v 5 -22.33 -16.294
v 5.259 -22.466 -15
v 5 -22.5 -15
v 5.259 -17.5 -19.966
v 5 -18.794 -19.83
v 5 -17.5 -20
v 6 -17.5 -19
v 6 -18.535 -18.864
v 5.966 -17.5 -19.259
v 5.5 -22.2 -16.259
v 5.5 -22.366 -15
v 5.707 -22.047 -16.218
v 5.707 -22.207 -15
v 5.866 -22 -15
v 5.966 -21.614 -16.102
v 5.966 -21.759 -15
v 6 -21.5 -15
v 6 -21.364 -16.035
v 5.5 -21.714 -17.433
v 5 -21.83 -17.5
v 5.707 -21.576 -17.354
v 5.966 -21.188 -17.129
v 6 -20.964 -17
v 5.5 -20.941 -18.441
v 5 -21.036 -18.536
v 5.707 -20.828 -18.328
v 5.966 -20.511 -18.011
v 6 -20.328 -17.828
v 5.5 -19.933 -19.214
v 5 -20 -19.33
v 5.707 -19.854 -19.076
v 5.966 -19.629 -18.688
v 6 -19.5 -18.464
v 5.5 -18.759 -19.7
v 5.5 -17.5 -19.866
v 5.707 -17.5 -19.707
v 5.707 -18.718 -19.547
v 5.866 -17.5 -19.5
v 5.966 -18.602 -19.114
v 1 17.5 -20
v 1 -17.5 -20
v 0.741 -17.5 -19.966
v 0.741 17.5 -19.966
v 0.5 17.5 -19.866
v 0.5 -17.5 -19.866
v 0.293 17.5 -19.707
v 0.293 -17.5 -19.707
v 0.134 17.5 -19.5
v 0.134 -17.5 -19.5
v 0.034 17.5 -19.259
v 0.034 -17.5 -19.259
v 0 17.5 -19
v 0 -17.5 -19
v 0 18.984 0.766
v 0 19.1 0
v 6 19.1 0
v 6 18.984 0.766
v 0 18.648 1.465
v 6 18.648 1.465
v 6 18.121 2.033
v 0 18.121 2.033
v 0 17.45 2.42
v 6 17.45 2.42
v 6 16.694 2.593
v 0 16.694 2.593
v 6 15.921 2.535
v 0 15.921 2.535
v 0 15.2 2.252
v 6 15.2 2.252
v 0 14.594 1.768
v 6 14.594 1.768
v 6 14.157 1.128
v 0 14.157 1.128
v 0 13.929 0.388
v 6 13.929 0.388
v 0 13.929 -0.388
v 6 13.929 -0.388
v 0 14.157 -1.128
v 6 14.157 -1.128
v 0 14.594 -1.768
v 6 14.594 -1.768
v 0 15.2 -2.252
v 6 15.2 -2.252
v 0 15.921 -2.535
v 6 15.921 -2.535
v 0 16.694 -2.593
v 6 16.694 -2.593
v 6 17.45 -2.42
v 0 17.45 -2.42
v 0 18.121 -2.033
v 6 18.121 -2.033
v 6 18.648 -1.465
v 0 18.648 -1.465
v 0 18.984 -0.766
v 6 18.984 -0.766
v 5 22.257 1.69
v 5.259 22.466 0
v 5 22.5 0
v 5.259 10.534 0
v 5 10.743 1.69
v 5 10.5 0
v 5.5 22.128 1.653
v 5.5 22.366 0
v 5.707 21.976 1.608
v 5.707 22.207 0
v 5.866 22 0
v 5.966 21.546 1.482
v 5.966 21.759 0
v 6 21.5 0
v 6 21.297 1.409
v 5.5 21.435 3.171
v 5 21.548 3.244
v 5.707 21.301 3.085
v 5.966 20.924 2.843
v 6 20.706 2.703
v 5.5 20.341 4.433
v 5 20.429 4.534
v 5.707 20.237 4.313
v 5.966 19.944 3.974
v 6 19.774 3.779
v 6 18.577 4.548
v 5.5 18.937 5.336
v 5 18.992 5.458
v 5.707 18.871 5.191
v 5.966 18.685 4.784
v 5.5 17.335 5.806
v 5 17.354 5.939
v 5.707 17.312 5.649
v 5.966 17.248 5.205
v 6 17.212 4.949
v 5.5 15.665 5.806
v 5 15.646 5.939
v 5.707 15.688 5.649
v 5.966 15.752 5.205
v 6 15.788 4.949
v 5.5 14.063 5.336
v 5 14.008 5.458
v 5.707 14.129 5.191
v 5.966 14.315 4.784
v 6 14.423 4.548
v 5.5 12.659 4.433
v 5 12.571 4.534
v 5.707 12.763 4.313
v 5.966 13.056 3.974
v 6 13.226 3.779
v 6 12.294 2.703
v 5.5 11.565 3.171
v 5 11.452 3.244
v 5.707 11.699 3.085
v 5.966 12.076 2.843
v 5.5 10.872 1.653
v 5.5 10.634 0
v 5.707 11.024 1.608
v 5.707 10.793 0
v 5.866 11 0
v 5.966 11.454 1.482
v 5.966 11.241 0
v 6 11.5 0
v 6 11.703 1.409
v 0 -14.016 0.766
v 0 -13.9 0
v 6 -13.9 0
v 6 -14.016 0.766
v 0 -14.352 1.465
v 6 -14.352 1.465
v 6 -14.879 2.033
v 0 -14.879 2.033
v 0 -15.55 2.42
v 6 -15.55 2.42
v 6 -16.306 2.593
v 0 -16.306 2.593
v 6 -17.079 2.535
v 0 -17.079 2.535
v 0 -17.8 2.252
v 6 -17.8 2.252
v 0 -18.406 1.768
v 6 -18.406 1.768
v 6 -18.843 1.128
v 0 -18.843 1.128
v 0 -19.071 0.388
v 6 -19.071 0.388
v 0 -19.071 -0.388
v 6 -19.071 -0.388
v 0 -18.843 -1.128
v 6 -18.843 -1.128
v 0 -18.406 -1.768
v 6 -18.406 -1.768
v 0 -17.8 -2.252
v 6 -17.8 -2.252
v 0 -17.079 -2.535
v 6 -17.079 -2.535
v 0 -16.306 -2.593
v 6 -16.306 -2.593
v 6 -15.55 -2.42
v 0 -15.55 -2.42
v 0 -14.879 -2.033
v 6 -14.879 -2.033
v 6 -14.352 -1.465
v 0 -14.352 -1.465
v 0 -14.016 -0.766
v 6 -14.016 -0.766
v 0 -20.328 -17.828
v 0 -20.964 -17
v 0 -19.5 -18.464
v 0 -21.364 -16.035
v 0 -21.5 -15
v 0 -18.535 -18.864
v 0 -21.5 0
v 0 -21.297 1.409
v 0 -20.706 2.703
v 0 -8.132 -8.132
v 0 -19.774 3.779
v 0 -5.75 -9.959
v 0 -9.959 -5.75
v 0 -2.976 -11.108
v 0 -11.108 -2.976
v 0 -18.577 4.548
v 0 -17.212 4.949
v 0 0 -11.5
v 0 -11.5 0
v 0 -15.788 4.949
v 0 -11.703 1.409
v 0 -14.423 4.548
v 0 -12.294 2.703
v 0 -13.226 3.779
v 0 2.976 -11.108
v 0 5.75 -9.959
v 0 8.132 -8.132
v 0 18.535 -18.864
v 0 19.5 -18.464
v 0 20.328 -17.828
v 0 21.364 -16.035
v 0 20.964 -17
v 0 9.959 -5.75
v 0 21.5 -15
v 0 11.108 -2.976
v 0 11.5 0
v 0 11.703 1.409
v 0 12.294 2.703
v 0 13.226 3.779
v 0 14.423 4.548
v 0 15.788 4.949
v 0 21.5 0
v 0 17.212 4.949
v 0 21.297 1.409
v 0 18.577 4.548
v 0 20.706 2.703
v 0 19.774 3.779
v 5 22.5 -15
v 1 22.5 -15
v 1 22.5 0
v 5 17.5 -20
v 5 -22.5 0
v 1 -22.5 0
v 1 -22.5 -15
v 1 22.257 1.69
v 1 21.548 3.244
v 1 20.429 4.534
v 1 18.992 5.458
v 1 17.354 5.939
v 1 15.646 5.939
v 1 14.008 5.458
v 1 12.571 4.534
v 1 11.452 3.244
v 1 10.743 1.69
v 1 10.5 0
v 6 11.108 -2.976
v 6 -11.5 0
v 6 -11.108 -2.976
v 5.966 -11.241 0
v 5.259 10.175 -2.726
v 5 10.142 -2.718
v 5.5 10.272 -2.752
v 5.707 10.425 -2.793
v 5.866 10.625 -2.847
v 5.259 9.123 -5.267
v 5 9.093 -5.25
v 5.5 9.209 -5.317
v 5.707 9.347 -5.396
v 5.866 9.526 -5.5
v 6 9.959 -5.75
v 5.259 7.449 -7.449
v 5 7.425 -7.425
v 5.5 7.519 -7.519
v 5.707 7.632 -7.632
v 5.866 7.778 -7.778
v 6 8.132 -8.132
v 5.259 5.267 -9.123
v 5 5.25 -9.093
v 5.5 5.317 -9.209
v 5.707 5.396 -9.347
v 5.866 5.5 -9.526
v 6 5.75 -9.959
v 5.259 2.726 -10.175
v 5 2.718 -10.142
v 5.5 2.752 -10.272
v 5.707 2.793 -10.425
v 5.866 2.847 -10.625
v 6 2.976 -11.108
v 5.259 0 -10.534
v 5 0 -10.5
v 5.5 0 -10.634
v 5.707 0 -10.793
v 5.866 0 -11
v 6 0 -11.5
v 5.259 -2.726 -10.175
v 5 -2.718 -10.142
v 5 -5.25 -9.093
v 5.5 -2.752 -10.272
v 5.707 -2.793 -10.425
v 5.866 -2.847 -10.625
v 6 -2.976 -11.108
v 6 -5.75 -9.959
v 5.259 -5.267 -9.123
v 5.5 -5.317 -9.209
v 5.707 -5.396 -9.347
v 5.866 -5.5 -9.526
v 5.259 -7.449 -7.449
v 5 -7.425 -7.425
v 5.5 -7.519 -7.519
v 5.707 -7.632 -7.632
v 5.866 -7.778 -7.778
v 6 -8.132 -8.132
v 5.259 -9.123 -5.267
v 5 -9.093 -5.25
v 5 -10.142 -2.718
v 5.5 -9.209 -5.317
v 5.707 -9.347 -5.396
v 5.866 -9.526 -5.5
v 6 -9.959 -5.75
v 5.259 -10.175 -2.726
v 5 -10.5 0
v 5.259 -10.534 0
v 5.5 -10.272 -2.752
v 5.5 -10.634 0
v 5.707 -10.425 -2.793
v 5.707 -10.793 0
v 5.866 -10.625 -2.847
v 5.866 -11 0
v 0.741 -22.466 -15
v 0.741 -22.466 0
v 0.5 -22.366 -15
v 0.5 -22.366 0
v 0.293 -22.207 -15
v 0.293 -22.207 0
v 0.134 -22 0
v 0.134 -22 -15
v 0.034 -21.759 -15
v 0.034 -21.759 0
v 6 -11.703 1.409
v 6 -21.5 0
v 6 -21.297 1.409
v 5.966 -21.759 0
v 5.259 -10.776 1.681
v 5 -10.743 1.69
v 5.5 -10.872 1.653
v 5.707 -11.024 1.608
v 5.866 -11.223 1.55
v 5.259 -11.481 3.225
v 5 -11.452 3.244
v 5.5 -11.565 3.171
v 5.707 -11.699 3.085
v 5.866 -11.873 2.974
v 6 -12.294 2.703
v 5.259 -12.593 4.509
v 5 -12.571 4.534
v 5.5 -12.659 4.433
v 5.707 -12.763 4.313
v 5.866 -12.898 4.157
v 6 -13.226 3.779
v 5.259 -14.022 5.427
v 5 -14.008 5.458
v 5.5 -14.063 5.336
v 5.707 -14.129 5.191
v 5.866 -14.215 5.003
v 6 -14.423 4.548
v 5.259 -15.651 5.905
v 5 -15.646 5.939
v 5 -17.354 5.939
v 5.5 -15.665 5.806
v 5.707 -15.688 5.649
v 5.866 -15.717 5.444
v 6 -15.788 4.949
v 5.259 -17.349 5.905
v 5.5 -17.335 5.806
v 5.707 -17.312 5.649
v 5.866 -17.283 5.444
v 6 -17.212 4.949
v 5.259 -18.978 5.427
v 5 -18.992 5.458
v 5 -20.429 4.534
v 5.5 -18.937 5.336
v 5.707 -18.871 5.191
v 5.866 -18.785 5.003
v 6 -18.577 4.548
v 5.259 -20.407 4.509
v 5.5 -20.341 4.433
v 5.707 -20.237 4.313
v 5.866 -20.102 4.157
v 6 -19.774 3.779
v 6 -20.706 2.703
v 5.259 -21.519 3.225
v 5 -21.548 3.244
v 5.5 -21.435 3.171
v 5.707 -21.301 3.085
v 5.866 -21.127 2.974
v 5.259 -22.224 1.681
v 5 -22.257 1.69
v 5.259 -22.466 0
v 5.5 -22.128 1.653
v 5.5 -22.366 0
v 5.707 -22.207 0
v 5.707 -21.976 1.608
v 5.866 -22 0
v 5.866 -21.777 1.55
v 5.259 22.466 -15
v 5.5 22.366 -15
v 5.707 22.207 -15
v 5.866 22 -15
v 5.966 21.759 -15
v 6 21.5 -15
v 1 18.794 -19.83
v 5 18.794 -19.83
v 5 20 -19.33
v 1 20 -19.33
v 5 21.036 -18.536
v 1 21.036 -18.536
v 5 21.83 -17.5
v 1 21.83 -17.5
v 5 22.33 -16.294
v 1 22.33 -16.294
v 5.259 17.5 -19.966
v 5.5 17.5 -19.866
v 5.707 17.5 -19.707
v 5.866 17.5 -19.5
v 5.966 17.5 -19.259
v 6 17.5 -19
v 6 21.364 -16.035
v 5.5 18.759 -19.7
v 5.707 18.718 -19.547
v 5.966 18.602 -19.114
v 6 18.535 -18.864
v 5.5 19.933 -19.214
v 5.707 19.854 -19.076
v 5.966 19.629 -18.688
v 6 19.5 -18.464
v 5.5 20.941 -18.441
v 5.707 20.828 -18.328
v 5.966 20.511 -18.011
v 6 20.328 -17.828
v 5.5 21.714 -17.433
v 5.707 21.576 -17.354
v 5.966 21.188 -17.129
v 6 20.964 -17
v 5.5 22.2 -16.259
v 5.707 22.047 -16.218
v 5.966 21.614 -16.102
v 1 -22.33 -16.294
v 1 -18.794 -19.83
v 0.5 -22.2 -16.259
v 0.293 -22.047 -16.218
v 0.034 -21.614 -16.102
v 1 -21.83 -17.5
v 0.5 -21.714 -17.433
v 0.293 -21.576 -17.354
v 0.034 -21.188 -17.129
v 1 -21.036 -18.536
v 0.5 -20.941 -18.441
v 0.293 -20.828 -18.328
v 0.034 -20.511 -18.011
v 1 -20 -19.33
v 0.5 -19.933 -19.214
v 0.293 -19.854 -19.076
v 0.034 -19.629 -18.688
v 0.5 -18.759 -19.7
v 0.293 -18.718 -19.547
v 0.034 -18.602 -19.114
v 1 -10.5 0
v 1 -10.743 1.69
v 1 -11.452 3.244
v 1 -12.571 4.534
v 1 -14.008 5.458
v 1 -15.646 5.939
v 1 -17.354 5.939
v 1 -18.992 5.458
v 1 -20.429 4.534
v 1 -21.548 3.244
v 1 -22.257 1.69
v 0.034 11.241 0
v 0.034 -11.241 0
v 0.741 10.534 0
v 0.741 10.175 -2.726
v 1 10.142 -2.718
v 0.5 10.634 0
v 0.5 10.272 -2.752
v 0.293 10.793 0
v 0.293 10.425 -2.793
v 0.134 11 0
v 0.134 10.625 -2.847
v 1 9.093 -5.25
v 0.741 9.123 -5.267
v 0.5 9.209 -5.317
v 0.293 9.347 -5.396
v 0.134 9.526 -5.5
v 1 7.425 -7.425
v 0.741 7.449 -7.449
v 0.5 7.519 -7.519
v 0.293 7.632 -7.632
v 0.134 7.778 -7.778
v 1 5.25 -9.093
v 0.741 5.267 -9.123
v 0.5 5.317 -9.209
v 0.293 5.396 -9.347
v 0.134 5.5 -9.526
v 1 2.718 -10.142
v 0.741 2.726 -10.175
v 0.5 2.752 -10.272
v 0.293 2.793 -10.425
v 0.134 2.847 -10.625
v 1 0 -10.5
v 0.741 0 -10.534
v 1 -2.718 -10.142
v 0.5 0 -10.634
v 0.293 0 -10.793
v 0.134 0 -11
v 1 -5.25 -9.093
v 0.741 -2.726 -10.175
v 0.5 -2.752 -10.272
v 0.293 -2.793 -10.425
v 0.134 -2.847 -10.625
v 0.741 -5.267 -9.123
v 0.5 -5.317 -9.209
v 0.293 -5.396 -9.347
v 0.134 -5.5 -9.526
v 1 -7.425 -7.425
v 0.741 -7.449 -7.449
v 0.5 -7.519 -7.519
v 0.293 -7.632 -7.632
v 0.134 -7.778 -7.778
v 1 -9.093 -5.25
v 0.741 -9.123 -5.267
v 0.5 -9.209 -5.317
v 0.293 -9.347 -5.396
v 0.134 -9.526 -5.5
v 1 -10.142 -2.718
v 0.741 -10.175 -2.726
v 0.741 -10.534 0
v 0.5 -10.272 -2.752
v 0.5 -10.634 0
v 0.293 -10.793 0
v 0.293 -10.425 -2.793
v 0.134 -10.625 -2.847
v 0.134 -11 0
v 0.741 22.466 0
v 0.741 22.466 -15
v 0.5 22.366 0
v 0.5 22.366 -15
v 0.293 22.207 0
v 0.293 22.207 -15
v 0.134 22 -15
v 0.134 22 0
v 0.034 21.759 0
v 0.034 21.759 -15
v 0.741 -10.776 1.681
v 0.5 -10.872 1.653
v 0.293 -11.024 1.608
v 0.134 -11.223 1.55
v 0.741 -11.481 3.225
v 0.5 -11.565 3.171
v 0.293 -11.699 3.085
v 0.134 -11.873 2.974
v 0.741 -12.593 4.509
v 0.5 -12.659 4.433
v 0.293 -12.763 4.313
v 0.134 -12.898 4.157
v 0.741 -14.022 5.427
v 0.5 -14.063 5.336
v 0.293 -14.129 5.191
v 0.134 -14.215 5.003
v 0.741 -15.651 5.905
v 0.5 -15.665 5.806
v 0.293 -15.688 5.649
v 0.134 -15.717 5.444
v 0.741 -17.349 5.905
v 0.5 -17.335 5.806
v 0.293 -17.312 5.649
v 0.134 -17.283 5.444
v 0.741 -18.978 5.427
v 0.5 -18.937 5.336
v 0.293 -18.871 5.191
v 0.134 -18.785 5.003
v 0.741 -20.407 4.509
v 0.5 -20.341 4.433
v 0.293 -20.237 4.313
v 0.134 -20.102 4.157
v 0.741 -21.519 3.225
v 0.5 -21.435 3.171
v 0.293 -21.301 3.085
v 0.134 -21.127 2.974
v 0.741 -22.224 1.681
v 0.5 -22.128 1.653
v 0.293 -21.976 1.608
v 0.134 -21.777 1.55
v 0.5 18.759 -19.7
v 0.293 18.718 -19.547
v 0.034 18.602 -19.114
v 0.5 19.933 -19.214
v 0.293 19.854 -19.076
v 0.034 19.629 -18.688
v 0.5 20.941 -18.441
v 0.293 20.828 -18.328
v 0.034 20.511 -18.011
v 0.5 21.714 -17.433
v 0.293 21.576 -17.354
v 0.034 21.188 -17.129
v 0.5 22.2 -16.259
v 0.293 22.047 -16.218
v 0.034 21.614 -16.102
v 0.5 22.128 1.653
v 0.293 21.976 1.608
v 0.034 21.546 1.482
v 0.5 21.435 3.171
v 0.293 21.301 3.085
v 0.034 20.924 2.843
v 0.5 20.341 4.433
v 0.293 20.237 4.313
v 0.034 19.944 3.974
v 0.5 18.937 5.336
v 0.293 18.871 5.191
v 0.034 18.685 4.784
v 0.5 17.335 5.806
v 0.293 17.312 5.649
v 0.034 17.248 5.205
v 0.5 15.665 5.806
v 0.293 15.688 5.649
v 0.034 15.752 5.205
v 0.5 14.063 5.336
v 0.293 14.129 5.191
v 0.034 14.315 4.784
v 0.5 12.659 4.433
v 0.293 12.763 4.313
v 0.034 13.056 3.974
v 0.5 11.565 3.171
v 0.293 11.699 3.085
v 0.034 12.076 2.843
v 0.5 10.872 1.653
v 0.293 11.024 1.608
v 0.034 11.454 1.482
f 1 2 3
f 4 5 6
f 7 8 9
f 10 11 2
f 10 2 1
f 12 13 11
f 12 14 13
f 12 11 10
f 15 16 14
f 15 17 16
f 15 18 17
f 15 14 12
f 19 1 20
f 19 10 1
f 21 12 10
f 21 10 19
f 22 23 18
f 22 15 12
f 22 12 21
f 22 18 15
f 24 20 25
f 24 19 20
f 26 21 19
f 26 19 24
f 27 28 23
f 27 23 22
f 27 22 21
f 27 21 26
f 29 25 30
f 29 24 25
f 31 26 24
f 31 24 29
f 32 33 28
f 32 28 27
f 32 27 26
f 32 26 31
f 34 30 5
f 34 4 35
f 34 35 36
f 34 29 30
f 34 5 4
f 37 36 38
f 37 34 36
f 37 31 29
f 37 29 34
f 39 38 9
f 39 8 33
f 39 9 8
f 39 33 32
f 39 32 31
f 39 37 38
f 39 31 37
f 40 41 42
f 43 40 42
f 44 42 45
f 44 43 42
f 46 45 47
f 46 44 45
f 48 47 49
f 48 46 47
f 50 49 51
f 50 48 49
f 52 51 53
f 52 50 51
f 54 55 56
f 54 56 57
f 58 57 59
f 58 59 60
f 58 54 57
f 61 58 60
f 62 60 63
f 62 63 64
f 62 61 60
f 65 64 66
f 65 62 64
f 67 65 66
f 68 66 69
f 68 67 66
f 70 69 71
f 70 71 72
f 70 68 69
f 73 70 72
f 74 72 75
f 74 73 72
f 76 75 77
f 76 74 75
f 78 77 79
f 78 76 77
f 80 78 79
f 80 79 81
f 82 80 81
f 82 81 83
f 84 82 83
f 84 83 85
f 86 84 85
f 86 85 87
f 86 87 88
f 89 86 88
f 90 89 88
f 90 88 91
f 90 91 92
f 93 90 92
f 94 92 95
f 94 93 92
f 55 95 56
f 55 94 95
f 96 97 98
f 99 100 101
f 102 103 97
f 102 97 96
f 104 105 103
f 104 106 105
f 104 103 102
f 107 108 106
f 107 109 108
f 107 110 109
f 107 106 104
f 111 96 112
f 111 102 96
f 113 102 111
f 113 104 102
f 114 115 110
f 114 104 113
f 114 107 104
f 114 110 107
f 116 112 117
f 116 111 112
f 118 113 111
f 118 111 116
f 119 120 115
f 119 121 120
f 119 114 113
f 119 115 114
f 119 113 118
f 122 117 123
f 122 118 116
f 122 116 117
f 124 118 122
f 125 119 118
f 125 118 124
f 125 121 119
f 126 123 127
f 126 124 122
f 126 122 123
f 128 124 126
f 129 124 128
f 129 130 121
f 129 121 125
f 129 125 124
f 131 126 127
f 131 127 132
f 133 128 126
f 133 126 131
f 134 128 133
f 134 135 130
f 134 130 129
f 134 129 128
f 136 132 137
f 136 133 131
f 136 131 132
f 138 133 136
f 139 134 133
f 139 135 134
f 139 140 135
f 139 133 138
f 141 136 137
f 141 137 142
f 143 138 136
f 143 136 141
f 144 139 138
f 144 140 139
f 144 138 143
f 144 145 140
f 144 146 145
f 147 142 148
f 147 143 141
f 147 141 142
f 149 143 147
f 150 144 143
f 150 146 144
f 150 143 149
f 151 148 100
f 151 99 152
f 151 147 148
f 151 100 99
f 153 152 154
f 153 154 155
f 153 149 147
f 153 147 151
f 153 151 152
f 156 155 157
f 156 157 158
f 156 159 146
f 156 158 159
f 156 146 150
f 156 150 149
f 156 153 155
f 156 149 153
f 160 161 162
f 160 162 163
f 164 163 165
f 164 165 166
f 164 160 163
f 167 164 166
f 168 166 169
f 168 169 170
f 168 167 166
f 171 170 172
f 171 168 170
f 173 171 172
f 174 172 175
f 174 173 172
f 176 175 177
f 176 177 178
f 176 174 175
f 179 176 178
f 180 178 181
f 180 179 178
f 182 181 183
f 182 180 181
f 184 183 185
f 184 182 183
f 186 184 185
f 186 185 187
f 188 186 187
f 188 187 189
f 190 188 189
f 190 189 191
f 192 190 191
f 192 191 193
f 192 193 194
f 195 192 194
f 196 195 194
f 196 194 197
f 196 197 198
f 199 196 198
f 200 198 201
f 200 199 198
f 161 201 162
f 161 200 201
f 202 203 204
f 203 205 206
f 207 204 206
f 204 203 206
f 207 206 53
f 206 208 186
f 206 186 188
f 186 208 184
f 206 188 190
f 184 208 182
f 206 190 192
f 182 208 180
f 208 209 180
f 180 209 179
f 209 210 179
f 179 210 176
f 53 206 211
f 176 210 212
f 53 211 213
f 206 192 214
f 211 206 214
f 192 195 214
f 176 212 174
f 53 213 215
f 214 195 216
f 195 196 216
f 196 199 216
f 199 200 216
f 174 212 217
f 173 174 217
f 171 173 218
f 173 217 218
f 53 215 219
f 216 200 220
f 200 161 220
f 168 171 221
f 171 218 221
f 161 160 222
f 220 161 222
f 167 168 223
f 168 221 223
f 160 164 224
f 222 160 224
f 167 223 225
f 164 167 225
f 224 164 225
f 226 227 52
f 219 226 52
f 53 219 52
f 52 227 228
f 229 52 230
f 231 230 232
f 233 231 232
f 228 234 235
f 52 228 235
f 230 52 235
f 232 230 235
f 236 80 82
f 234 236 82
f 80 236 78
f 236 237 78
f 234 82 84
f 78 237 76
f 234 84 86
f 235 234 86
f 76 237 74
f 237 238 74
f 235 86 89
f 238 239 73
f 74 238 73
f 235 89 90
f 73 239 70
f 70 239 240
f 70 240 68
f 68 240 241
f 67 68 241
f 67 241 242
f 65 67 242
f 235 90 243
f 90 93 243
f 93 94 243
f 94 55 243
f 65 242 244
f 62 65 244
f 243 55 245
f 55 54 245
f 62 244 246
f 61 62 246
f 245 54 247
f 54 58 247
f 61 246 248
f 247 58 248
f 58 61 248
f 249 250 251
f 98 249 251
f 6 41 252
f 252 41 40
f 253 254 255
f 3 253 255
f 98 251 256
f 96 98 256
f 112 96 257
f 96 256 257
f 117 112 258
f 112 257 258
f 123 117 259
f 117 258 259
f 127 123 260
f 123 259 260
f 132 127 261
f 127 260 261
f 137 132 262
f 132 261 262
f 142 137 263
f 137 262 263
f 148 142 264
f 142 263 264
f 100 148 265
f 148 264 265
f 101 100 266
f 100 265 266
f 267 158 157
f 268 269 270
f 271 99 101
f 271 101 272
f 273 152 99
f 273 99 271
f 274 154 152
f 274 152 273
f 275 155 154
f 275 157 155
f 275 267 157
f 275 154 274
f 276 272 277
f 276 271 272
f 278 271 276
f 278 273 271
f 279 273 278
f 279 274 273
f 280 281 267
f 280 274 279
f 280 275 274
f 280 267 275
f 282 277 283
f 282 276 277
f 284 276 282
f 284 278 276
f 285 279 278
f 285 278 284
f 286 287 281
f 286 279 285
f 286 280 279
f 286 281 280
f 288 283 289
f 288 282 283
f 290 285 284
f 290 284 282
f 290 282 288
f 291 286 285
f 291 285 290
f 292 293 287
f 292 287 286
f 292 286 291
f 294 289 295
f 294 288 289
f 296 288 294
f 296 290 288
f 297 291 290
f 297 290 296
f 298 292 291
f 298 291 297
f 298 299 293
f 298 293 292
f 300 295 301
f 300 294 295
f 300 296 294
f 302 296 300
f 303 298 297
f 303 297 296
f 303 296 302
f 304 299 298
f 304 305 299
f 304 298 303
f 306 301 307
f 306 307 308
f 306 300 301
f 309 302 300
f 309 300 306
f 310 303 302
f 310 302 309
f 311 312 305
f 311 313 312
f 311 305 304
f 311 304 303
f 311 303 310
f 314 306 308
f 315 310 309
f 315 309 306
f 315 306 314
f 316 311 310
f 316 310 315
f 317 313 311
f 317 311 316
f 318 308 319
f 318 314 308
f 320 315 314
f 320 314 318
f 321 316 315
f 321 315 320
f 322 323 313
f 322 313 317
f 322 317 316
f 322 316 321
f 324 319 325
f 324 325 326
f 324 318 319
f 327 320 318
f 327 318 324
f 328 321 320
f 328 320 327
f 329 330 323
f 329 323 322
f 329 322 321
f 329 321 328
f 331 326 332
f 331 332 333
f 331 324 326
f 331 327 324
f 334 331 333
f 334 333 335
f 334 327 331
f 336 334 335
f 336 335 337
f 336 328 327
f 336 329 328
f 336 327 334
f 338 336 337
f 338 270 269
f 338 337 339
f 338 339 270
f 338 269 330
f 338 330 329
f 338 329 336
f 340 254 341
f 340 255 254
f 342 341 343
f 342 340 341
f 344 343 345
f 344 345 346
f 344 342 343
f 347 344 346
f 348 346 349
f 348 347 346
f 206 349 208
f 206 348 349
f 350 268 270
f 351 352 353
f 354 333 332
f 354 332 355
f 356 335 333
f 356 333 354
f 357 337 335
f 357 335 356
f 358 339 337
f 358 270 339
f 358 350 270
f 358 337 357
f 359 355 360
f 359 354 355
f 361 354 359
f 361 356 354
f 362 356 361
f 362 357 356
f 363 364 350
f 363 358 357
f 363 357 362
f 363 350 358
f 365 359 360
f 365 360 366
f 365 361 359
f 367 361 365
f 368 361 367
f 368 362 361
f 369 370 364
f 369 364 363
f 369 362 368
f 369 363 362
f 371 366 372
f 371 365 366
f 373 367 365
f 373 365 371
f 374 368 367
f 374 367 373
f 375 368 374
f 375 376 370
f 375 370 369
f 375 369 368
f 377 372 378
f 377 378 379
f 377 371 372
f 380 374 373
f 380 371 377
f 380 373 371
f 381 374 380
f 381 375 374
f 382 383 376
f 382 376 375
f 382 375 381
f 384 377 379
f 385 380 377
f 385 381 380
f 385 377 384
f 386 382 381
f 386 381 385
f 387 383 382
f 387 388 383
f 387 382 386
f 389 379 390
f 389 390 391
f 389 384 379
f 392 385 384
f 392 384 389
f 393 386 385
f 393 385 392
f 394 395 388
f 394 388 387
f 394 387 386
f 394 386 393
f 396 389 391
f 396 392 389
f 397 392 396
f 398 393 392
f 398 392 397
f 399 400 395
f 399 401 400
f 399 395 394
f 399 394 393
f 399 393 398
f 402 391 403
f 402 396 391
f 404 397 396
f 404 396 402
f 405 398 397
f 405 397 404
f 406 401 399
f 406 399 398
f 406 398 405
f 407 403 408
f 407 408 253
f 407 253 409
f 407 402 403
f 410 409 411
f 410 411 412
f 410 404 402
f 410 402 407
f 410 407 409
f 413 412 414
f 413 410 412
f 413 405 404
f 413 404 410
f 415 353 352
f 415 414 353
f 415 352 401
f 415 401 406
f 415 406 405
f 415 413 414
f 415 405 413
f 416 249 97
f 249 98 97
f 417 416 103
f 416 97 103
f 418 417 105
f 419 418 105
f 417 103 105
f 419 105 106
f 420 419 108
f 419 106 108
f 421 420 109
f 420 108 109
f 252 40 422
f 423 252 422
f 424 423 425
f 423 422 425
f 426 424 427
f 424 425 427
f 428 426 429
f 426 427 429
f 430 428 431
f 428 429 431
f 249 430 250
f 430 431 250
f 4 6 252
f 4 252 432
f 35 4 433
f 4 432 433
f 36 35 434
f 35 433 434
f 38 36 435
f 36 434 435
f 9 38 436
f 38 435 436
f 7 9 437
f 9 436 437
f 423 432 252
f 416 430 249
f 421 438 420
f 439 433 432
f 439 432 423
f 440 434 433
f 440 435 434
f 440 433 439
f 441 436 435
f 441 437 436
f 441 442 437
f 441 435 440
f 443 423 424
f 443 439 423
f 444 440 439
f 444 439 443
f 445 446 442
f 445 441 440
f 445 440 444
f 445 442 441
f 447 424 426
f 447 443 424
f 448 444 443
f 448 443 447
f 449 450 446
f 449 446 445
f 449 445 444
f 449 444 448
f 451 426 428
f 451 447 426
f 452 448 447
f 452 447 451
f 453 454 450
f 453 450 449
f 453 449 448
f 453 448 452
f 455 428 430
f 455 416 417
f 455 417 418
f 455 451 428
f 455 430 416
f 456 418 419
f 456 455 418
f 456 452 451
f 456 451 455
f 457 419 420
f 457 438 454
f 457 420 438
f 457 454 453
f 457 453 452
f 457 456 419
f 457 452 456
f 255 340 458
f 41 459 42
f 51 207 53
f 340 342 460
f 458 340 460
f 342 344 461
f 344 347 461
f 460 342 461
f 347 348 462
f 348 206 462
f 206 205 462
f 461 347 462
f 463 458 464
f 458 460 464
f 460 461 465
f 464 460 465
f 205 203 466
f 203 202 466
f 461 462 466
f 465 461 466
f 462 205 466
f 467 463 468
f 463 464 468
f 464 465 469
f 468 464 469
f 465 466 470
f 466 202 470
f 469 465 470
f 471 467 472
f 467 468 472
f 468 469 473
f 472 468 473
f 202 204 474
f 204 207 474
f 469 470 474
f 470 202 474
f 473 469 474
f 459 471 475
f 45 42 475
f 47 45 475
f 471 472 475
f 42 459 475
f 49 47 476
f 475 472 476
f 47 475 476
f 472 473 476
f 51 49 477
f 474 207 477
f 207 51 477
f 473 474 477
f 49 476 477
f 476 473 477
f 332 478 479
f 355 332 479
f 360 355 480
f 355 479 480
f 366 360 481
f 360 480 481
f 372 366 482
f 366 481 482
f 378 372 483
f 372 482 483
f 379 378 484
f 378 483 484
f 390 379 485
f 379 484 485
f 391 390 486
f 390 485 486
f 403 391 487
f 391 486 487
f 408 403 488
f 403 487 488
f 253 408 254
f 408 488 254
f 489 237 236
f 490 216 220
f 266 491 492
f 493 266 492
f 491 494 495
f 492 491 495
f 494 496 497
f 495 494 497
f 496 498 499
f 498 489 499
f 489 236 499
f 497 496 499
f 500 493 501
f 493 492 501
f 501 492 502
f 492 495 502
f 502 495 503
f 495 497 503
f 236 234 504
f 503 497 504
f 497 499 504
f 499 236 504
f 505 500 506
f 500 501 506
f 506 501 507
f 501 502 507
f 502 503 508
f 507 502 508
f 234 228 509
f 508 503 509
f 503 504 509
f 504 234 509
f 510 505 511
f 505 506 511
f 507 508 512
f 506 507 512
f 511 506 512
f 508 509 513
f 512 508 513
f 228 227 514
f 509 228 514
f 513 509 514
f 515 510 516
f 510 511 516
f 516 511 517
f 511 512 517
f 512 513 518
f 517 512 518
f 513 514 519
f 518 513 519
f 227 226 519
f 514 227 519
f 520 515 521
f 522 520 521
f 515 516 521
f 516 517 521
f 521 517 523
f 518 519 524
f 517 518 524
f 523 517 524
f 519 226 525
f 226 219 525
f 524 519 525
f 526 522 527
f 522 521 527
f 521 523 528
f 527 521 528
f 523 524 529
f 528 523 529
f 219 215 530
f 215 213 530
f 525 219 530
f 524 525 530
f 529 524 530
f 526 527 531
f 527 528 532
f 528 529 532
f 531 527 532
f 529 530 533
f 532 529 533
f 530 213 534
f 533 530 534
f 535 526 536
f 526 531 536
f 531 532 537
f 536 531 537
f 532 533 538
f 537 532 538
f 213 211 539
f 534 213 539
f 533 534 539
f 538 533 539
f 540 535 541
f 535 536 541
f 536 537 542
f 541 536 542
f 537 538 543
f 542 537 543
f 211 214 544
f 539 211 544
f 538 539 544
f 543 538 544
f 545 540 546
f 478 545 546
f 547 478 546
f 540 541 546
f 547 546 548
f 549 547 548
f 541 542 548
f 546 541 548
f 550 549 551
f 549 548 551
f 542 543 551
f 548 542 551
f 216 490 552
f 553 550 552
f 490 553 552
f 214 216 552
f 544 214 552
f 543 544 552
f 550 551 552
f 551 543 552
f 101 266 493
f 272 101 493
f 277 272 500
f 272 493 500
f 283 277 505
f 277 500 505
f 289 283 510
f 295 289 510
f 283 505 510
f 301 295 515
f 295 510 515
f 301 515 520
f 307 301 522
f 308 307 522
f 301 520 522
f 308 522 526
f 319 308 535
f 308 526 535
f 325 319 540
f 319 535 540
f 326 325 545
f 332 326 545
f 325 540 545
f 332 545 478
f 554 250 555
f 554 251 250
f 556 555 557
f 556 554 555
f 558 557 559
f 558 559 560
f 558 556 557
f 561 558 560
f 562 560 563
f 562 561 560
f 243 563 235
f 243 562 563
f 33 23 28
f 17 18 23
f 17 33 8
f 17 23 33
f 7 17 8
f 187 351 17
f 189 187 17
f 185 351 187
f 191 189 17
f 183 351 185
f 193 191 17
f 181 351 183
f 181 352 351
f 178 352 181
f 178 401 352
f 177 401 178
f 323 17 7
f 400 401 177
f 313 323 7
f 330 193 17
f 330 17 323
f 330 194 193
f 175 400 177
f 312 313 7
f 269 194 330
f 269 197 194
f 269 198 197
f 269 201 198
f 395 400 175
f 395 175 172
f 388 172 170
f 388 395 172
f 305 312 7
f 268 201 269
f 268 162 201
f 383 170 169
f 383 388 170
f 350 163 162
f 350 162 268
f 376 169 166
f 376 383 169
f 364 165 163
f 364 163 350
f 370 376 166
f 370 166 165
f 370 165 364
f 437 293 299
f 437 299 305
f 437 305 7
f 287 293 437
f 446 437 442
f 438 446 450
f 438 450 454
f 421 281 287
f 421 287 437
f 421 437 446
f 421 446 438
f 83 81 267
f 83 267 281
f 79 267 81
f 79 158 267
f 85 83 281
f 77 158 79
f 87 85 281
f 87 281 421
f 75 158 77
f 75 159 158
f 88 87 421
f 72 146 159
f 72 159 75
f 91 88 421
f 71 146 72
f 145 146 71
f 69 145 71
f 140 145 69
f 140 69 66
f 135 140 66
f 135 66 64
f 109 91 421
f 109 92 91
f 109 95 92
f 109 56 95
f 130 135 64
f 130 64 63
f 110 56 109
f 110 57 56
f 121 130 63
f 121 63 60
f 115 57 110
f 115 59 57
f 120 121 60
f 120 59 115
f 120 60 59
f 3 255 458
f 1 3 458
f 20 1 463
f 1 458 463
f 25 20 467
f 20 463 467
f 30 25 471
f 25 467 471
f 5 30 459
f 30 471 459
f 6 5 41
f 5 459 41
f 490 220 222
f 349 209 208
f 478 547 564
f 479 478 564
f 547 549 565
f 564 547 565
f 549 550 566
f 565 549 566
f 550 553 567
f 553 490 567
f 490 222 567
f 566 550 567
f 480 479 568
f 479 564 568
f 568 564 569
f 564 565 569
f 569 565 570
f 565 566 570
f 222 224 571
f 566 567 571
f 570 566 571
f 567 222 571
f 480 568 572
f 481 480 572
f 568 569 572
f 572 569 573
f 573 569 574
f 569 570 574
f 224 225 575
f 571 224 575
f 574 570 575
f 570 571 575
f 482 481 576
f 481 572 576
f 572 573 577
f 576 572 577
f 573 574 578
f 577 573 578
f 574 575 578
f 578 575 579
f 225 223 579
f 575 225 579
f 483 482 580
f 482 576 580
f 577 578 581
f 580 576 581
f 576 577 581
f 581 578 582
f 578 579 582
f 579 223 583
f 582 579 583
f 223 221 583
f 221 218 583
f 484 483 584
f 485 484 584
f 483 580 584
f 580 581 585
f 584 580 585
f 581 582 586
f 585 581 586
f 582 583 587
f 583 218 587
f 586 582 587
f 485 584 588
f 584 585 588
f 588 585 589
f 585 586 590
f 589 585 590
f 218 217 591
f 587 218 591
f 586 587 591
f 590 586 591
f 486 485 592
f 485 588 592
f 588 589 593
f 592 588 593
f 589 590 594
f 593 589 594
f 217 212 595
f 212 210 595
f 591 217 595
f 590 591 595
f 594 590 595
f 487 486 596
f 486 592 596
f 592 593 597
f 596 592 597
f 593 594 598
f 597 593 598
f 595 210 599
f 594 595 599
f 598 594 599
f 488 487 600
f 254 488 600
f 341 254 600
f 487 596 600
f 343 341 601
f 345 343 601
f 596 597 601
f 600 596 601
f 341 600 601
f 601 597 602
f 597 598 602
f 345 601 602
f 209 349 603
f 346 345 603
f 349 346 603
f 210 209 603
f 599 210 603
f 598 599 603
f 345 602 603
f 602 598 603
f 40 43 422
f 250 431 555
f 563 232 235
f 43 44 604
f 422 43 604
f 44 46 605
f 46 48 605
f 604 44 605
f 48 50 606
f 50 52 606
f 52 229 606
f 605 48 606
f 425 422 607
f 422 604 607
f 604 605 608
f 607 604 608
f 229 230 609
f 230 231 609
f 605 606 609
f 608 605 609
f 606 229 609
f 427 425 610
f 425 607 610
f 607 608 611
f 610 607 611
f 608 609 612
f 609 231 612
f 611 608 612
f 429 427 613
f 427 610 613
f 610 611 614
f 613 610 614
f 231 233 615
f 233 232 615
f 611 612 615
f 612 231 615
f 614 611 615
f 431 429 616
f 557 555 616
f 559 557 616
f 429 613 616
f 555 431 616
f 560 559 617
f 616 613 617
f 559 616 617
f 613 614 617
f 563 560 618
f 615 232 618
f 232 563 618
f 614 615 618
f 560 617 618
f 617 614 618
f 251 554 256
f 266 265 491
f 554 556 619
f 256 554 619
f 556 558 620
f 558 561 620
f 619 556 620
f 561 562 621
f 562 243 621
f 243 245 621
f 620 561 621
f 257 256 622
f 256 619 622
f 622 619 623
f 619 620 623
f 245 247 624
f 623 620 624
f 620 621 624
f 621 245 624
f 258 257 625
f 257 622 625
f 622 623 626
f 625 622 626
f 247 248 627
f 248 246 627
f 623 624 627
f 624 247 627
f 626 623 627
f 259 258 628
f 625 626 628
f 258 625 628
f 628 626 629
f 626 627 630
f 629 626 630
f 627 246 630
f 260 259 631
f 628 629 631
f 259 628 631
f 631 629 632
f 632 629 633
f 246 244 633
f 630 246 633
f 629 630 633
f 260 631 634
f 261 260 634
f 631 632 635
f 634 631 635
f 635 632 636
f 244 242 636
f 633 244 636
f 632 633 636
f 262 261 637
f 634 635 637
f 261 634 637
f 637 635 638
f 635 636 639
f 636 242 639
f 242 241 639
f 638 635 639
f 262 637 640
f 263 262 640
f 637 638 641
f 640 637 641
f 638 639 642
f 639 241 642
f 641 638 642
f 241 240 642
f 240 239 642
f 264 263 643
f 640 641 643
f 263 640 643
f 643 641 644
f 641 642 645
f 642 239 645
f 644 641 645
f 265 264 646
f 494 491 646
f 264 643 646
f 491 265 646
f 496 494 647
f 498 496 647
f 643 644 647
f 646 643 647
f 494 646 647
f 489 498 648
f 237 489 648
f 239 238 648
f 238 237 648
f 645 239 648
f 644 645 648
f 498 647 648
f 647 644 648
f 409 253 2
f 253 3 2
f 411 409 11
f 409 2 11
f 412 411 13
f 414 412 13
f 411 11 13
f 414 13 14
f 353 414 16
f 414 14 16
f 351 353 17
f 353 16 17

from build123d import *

# Parameters (mm, degrees)
F0_R     = 2.6
F1_DEPTH = 6
F2_R     = 1


with BuildPart() as f1:
    # F0 (on Right) → F1 (new body)
    with BuildSketch(Plane.YZ):
        with BuildLine():
            ThreePointArc((10.5, 0), (0, -10.5), (-10.5, 0))
            ThreePointArc((-10.5, 0), (-16.5, 6), (-22.5, 0))
            Line((-22.5, 0), (-22.5, -15))
            ThreePointArc((-22.5, -15), (-21.035534, -18.535534), (-17.5, -20))
            Line((-17.5, -20), (17.5, -20))
            ThreePointArc((17.5, -20), (21.035534, -18.535534), (22.5, -15))
            Line((22.5, -15), (22.5, 0))
            ThreePointArc((22.5, 0), (16.5, 6), (10.5, 0))
        make_face()
        with Locations((-16.5, 0)):
            Circle(F0_R, mode=Mode.SUBTRACT)
        with Locations((16.5, 0)):
            Circle(F0_R, mode=Mode.SUBTRACT)
    extrude(amount=F1_DEPTH)

    # F2
    f2_edges = [f1.edges().sort_by_distance(p)[0] for p in [
        (6, -22.5, -7.5),
        (0, -22.5, -7.5),
    ]]
    fillet(f2_edges, radius=F2_R)


solid = f1.part
